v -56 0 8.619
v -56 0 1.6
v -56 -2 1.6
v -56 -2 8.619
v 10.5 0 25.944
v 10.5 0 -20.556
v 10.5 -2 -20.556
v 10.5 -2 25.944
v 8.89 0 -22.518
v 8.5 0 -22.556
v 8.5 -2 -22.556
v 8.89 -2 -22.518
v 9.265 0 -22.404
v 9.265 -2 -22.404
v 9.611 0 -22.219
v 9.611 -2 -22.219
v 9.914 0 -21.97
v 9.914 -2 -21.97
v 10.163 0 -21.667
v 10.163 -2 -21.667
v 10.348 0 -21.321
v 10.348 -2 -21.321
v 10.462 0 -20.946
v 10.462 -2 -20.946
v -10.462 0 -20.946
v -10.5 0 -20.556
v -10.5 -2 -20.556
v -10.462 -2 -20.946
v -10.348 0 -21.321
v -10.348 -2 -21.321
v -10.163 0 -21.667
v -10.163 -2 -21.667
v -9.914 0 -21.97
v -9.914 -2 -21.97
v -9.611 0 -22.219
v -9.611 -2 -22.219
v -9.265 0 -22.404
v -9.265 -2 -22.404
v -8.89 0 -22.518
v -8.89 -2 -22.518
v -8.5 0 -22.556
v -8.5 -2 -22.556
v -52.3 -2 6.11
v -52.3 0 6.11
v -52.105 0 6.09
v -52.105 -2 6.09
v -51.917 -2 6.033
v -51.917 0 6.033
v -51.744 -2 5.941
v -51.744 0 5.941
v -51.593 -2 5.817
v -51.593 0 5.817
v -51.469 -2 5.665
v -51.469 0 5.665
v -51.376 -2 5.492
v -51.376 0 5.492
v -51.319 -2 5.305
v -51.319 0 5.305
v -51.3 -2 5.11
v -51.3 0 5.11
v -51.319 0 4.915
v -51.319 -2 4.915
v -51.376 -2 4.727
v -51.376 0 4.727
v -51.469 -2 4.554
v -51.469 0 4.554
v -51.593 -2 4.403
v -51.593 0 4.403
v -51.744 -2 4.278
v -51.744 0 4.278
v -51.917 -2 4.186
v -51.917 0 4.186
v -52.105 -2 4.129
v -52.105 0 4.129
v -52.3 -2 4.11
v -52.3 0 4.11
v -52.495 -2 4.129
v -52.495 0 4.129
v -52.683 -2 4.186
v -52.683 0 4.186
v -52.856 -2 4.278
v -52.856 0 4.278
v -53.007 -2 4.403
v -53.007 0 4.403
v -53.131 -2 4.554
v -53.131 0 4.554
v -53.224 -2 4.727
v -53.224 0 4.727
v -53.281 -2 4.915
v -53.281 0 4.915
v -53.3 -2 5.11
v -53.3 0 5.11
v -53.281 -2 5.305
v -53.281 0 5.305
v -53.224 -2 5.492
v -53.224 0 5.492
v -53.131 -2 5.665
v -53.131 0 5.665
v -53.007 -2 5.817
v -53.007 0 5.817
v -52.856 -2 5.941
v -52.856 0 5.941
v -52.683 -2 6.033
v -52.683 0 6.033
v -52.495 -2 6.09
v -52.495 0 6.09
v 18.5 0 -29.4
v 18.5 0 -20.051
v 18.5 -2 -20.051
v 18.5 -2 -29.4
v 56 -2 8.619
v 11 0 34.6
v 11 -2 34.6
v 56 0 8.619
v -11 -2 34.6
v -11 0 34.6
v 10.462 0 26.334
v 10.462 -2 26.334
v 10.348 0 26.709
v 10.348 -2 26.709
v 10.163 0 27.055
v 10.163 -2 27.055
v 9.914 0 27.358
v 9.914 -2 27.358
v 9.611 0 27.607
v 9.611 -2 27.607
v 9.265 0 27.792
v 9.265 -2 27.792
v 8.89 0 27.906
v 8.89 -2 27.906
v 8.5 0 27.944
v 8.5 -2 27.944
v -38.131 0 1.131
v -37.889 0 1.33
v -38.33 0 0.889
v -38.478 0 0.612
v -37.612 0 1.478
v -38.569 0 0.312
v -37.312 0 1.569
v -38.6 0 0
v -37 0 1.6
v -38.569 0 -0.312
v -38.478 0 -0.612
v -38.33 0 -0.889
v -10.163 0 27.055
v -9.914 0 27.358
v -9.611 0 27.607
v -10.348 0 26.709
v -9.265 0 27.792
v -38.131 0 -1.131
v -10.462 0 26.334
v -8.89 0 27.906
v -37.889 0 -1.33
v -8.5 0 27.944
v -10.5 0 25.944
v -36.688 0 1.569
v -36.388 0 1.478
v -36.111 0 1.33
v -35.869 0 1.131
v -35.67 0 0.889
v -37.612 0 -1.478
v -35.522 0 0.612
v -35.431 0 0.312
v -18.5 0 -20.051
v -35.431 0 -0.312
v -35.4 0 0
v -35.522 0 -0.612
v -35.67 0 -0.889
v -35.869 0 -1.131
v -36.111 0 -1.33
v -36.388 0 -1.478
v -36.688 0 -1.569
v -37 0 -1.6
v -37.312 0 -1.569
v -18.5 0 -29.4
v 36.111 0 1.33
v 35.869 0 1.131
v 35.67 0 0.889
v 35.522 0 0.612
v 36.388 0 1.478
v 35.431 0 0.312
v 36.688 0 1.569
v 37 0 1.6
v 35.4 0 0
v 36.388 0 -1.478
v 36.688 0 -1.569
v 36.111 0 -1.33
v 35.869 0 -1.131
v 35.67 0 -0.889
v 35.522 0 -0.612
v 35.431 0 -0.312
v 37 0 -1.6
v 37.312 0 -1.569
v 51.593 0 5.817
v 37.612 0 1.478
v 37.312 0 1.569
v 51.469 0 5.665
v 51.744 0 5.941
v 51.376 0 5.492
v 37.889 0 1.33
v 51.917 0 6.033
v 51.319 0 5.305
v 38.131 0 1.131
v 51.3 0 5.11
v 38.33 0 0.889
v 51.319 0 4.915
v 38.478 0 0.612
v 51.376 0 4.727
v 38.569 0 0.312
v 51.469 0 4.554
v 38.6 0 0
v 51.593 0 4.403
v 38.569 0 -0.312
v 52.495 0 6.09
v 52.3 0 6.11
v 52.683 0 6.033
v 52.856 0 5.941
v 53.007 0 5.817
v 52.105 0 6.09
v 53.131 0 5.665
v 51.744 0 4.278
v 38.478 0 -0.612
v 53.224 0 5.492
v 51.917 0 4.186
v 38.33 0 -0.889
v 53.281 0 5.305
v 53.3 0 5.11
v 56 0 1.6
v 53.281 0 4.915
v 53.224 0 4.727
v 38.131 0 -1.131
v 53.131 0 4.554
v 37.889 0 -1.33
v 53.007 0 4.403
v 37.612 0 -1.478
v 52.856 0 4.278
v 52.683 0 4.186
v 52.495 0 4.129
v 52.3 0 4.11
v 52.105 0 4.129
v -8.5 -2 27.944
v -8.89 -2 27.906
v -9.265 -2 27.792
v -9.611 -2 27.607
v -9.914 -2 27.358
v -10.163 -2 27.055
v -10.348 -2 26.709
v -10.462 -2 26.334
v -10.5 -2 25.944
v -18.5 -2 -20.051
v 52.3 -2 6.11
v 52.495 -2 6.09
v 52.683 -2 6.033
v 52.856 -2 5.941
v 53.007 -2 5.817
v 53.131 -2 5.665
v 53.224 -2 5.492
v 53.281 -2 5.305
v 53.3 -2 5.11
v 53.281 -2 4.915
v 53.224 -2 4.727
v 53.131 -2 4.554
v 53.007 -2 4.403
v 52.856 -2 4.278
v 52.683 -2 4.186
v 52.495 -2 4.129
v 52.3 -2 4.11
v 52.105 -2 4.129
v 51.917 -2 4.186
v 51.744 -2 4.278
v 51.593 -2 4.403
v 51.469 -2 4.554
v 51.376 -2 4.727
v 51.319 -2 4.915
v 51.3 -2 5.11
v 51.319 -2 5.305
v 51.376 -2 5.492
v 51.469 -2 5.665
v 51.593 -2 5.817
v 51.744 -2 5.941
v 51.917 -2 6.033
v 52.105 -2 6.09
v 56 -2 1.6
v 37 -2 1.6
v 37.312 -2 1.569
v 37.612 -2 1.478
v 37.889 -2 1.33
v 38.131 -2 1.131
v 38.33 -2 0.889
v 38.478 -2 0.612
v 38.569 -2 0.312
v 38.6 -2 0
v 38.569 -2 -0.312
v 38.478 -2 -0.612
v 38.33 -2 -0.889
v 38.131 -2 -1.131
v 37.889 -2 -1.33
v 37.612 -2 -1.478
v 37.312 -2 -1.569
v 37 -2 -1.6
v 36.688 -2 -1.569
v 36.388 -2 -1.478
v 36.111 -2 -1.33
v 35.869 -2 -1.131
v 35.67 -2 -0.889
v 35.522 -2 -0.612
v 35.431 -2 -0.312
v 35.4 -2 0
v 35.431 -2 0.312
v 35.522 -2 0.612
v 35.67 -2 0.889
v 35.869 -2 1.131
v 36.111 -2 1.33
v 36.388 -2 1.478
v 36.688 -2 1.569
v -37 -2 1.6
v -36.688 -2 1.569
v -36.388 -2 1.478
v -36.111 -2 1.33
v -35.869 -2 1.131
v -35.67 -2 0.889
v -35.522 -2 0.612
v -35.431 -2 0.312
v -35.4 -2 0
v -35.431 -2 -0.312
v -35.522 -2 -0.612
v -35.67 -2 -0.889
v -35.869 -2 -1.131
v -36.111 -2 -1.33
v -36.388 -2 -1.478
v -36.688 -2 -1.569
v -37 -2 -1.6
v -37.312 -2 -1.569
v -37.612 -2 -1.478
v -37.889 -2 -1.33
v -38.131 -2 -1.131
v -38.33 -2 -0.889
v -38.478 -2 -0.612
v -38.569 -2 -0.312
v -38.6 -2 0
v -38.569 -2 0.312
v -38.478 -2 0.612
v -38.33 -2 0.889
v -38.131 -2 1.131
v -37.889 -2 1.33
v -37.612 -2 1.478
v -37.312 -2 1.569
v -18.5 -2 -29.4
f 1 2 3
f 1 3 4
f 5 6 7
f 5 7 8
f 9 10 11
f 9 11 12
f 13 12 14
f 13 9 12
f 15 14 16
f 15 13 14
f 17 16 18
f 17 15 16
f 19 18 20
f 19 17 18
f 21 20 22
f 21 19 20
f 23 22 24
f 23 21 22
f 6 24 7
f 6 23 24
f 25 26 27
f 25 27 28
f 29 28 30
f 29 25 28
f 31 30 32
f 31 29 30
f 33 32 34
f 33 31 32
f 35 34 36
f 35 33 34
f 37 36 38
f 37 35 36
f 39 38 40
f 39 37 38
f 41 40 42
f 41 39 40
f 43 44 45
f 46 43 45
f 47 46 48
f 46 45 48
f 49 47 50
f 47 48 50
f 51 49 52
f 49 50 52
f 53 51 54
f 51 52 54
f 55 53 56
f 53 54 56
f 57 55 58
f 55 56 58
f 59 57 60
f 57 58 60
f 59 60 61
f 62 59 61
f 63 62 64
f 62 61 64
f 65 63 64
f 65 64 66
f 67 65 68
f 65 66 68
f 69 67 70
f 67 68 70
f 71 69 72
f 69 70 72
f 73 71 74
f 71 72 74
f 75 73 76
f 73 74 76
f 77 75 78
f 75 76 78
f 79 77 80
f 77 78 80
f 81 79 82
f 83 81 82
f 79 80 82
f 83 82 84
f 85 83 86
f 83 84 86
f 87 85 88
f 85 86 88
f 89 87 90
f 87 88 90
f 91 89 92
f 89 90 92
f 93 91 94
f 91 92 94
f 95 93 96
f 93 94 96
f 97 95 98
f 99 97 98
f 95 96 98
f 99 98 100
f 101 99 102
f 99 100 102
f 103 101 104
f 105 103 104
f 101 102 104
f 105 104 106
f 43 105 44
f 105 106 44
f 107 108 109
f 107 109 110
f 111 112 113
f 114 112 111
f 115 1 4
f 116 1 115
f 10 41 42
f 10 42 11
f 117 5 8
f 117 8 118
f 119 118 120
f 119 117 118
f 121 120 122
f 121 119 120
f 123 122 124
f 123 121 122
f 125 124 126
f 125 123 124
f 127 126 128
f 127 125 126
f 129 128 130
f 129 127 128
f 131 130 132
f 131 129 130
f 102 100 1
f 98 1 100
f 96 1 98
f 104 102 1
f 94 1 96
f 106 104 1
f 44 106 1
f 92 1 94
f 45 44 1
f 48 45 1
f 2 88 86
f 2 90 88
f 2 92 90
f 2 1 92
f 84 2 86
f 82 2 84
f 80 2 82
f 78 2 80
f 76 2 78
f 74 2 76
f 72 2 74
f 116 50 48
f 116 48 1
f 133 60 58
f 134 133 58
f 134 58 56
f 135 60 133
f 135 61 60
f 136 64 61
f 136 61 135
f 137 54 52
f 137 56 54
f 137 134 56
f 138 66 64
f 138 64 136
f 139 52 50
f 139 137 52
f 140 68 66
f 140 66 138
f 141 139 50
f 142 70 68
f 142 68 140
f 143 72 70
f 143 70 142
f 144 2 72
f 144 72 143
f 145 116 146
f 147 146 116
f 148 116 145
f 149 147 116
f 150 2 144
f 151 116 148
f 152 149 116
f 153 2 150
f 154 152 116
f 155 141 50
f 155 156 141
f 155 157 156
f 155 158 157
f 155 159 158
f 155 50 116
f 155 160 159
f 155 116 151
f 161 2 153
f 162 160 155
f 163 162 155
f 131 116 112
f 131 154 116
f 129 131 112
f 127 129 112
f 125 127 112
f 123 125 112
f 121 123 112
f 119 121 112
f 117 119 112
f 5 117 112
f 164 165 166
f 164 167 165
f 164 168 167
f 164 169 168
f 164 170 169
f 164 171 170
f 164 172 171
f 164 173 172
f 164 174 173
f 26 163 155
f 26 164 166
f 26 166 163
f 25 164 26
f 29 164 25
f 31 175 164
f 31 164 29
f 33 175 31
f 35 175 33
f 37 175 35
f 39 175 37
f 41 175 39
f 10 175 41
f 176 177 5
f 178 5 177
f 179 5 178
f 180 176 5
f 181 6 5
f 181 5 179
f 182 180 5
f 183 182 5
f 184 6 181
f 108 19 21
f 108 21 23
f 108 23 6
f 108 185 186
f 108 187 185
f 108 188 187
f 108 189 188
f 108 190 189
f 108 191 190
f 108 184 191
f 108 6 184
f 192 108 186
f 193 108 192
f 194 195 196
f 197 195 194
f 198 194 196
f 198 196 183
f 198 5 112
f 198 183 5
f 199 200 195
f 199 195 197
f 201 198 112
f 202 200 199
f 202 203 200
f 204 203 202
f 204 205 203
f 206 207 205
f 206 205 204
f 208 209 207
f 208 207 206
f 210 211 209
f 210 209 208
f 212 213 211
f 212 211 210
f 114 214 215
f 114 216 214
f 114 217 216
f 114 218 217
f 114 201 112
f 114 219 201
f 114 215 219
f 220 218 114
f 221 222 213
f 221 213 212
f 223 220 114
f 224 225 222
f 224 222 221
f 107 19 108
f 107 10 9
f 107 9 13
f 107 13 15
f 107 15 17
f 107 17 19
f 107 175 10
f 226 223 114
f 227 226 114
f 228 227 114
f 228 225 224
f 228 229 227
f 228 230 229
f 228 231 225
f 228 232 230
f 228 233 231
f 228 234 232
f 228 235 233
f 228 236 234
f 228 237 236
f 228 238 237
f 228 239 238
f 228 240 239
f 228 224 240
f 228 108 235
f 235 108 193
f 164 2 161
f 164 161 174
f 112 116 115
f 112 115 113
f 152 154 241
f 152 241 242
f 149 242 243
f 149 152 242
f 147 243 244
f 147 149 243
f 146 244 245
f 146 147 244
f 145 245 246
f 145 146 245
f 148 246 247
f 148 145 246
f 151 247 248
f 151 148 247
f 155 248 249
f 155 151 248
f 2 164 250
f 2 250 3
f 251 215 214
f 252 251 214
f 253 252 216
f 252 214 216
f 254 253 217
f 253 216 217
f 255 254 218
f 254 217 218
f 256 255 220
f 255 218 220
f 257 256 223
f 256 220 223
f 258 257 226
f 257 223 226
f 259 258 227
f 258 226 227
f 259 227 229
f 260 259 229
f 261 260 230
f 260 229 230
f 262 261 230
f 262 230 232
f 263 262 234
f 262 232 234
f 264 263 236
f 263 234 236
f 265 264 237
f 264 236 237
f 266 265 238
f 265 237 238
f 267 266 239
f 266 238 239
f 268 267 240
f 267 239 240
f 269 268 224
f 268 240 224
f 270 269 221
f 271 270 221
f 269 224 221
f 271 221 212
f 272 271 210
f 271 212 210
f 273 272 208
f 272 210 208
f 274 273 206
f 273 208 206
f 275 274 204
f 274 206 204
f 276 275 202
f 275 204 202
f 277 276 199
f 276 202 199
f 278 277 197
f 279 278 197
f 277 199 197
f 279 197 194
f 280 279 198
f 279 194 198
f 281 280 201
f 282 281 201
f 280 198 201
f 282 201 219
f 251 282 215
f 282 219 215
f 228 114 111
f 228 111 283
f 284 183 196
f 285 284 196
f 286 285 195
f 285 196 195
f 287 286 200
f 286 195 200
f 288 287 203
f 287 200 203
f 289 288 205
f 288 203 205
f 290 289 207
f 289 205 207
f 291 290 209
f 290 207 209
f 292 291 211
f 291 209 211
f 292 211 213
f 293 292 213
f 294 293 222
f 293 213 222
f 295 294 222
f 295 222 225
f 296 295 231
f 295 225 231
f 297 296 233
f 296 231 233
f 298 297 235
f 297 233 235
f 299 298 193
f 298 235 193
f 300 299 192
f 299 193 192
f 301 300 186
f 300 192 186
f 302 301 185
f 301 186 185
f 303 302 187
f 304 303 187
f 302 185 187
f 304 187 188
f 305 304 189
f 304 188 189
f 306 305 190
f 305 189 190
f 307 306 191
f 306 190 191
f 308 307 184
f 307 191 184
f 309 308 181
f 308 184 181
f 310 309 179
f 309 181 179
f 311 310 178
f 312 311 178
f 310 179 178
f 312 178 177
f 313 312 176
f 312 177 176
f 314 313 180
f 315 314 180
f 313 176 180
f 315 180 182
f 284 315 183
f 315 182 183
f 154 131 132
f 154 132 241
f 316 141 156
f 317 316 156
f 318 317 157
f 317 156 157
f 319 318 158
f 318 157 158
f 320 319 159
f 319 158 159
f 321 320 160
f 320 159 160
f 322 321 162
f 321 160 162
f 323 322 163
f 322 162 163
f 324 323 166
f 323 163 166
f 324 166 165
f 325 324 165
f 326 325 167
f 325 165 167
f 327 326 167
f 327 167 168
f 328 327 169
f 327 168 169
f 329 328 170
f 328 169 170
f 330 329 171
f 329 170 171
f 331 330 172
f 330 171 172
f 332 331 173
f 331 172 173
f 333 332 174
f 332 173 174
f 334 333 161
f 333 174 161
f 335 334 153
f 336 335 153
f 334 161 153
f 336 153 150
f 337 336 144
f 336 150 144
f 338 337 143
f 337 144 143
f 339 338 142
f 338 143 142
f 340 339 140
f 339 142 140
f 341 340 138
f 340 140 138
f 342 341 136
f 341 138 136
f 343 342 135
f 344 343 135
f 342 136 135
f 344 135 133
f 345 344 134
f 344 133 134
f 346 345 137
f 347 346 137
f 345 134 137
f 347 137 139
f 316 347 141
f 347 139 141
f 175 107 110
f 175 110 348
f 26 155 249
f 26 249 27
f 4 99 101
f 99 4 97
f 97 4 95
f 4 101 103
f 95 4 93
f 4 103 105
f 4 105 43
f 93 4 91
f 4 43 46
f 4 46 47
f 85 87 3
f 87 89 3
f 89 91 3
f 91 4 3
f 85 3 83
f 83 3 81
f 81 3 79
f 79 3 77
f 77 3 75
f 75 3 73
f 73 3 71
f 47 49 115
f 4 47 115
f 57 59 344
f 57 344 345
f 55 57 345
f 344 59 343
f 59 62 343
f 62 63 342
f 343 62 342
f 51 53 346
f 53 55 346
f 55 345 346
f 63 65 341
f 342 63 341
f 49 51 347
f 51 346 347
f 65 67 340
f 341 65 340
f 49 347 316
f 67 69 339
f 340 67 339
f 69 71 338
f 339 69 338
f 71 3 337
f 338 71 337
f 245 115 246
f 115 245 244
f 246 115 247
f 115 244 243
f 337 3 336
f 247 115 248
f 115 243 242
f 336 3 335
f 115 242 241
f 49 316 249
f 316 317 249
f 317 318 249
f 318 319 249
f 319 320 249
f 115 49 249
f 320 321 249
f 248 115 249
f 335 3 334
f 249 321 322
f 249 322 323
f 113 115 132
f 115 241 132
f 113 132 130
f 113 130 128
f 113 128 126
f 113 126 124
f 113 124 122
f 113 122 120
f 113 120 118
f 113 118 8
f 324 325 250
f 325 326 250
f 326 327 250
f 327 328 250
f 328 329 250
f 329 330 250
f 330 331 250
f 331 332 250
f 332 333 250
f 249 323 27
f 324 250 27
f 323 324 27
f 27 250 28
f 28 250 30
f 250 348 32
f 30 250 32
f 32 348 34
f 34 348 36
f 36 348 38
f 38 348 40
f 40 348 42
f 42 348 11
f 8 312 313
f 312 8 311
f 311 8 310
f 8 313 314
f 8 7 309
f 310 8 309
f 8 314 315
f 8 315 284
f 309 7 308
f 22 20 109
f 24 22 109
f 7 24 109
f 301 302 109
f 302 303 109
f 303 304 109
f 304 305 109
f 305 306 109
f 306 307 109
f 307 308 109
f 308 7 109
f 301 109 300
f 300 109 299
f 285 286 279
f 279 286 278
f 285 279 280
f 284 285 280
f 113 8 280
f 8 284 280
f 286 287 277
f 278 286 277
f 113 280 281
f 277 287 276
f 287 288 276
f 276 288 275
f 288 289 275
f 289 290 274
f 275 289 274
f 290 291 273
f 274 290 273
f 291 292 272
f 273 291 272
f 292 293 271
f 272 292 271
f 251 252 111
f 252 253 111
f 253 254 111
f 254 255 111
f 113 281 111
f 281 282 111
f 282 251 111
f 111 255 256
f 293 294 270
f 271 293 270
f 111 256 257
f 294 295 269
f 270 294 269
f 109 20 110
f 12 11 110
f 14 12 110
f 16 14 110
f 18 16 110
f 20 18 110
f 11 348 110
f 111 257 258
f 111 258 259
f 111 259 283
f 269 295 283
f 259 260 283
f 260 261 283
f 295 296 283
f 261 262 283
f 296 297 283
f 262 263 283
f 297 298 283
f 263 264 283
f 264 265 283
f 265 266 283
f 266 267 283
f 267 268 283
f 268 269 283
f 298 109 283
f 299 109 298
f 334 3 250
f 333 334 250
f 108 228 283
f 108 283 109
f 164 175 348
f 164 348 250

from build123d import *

# Parameters (mm, degrees)
SKETCH4_R           = 1
SKETCH4_R_2         = 1.6
BOSS_EXTRUDE1_DEPTH = 2


with BuildPart() as part:
    # Sketch4 → Boss-Extrude1 (new body)
    with BuildSketch(Plane(origin=(0, 0, 0), x_dir=(1, 0, 0), z_dir=(0, 1, 0))):
        Polygon((-56, -1.6), (-56, -8.619237886), (-11, -34.6), (11, -34.6), (56, -8.619237886), (56, -1.6), (18.5, 20.050635095), (18.5, 29.4), (-18.5, 29.4), (-18.5, 20.050635095), align=None)
        with Locations(Location((-52.3, -5.109618943, 0), (0, 0, 270))):
            Circle(SKETCH4_R, mode=Mode.SUBTRACT)
        with Locations(Location((52.3, -5.109618943, 0), (0, 0, 270))):
            Circle(SKETCH4_R, mode=Mode.SUBTRACT)
        with Locations(Location((37, 0, 0), (0, 0, 270))):
            Circle(SKETCH4_R_2, mode=Mode.SUBTRACT)
        with Locations(Location((-37, 0, 0), (0, 0, 270))):
            Circle(SKETCH4_R_2, mode=Mode.SUBTRACT)
        with BuildLine():
            Line((8.5, -27.944), (-8.5, -27.944))
            ThreePointArc((-8.5, -27.944), (-9.914213562, -27.358213562), (-10.5, -25.944))
            Line((-10.5, -25.944), (-10.5, 20.556))
            ThreePointArc((-10.5, 20.556), (-9.914213562, 21.970213562), (-8.5, 22.556))
            Line((-8.5, 22.556), (8.5, 22.556))
            ThreePointArc((8.5, 22.556), (9.914213562, 21.970213562), (10.5, 20.556))
            Line((10.5, 20.556), (10.5, -25.944))
            ThreePointArc((10.5, -25.944), (9.914213562, -27.358213562), (8.5, -27.944))
        make_face(mode=Mode.SUBTRACT)
    extrude(amount=-BOSS_EXTRUDE1_DEPTH)


solid = part.part
